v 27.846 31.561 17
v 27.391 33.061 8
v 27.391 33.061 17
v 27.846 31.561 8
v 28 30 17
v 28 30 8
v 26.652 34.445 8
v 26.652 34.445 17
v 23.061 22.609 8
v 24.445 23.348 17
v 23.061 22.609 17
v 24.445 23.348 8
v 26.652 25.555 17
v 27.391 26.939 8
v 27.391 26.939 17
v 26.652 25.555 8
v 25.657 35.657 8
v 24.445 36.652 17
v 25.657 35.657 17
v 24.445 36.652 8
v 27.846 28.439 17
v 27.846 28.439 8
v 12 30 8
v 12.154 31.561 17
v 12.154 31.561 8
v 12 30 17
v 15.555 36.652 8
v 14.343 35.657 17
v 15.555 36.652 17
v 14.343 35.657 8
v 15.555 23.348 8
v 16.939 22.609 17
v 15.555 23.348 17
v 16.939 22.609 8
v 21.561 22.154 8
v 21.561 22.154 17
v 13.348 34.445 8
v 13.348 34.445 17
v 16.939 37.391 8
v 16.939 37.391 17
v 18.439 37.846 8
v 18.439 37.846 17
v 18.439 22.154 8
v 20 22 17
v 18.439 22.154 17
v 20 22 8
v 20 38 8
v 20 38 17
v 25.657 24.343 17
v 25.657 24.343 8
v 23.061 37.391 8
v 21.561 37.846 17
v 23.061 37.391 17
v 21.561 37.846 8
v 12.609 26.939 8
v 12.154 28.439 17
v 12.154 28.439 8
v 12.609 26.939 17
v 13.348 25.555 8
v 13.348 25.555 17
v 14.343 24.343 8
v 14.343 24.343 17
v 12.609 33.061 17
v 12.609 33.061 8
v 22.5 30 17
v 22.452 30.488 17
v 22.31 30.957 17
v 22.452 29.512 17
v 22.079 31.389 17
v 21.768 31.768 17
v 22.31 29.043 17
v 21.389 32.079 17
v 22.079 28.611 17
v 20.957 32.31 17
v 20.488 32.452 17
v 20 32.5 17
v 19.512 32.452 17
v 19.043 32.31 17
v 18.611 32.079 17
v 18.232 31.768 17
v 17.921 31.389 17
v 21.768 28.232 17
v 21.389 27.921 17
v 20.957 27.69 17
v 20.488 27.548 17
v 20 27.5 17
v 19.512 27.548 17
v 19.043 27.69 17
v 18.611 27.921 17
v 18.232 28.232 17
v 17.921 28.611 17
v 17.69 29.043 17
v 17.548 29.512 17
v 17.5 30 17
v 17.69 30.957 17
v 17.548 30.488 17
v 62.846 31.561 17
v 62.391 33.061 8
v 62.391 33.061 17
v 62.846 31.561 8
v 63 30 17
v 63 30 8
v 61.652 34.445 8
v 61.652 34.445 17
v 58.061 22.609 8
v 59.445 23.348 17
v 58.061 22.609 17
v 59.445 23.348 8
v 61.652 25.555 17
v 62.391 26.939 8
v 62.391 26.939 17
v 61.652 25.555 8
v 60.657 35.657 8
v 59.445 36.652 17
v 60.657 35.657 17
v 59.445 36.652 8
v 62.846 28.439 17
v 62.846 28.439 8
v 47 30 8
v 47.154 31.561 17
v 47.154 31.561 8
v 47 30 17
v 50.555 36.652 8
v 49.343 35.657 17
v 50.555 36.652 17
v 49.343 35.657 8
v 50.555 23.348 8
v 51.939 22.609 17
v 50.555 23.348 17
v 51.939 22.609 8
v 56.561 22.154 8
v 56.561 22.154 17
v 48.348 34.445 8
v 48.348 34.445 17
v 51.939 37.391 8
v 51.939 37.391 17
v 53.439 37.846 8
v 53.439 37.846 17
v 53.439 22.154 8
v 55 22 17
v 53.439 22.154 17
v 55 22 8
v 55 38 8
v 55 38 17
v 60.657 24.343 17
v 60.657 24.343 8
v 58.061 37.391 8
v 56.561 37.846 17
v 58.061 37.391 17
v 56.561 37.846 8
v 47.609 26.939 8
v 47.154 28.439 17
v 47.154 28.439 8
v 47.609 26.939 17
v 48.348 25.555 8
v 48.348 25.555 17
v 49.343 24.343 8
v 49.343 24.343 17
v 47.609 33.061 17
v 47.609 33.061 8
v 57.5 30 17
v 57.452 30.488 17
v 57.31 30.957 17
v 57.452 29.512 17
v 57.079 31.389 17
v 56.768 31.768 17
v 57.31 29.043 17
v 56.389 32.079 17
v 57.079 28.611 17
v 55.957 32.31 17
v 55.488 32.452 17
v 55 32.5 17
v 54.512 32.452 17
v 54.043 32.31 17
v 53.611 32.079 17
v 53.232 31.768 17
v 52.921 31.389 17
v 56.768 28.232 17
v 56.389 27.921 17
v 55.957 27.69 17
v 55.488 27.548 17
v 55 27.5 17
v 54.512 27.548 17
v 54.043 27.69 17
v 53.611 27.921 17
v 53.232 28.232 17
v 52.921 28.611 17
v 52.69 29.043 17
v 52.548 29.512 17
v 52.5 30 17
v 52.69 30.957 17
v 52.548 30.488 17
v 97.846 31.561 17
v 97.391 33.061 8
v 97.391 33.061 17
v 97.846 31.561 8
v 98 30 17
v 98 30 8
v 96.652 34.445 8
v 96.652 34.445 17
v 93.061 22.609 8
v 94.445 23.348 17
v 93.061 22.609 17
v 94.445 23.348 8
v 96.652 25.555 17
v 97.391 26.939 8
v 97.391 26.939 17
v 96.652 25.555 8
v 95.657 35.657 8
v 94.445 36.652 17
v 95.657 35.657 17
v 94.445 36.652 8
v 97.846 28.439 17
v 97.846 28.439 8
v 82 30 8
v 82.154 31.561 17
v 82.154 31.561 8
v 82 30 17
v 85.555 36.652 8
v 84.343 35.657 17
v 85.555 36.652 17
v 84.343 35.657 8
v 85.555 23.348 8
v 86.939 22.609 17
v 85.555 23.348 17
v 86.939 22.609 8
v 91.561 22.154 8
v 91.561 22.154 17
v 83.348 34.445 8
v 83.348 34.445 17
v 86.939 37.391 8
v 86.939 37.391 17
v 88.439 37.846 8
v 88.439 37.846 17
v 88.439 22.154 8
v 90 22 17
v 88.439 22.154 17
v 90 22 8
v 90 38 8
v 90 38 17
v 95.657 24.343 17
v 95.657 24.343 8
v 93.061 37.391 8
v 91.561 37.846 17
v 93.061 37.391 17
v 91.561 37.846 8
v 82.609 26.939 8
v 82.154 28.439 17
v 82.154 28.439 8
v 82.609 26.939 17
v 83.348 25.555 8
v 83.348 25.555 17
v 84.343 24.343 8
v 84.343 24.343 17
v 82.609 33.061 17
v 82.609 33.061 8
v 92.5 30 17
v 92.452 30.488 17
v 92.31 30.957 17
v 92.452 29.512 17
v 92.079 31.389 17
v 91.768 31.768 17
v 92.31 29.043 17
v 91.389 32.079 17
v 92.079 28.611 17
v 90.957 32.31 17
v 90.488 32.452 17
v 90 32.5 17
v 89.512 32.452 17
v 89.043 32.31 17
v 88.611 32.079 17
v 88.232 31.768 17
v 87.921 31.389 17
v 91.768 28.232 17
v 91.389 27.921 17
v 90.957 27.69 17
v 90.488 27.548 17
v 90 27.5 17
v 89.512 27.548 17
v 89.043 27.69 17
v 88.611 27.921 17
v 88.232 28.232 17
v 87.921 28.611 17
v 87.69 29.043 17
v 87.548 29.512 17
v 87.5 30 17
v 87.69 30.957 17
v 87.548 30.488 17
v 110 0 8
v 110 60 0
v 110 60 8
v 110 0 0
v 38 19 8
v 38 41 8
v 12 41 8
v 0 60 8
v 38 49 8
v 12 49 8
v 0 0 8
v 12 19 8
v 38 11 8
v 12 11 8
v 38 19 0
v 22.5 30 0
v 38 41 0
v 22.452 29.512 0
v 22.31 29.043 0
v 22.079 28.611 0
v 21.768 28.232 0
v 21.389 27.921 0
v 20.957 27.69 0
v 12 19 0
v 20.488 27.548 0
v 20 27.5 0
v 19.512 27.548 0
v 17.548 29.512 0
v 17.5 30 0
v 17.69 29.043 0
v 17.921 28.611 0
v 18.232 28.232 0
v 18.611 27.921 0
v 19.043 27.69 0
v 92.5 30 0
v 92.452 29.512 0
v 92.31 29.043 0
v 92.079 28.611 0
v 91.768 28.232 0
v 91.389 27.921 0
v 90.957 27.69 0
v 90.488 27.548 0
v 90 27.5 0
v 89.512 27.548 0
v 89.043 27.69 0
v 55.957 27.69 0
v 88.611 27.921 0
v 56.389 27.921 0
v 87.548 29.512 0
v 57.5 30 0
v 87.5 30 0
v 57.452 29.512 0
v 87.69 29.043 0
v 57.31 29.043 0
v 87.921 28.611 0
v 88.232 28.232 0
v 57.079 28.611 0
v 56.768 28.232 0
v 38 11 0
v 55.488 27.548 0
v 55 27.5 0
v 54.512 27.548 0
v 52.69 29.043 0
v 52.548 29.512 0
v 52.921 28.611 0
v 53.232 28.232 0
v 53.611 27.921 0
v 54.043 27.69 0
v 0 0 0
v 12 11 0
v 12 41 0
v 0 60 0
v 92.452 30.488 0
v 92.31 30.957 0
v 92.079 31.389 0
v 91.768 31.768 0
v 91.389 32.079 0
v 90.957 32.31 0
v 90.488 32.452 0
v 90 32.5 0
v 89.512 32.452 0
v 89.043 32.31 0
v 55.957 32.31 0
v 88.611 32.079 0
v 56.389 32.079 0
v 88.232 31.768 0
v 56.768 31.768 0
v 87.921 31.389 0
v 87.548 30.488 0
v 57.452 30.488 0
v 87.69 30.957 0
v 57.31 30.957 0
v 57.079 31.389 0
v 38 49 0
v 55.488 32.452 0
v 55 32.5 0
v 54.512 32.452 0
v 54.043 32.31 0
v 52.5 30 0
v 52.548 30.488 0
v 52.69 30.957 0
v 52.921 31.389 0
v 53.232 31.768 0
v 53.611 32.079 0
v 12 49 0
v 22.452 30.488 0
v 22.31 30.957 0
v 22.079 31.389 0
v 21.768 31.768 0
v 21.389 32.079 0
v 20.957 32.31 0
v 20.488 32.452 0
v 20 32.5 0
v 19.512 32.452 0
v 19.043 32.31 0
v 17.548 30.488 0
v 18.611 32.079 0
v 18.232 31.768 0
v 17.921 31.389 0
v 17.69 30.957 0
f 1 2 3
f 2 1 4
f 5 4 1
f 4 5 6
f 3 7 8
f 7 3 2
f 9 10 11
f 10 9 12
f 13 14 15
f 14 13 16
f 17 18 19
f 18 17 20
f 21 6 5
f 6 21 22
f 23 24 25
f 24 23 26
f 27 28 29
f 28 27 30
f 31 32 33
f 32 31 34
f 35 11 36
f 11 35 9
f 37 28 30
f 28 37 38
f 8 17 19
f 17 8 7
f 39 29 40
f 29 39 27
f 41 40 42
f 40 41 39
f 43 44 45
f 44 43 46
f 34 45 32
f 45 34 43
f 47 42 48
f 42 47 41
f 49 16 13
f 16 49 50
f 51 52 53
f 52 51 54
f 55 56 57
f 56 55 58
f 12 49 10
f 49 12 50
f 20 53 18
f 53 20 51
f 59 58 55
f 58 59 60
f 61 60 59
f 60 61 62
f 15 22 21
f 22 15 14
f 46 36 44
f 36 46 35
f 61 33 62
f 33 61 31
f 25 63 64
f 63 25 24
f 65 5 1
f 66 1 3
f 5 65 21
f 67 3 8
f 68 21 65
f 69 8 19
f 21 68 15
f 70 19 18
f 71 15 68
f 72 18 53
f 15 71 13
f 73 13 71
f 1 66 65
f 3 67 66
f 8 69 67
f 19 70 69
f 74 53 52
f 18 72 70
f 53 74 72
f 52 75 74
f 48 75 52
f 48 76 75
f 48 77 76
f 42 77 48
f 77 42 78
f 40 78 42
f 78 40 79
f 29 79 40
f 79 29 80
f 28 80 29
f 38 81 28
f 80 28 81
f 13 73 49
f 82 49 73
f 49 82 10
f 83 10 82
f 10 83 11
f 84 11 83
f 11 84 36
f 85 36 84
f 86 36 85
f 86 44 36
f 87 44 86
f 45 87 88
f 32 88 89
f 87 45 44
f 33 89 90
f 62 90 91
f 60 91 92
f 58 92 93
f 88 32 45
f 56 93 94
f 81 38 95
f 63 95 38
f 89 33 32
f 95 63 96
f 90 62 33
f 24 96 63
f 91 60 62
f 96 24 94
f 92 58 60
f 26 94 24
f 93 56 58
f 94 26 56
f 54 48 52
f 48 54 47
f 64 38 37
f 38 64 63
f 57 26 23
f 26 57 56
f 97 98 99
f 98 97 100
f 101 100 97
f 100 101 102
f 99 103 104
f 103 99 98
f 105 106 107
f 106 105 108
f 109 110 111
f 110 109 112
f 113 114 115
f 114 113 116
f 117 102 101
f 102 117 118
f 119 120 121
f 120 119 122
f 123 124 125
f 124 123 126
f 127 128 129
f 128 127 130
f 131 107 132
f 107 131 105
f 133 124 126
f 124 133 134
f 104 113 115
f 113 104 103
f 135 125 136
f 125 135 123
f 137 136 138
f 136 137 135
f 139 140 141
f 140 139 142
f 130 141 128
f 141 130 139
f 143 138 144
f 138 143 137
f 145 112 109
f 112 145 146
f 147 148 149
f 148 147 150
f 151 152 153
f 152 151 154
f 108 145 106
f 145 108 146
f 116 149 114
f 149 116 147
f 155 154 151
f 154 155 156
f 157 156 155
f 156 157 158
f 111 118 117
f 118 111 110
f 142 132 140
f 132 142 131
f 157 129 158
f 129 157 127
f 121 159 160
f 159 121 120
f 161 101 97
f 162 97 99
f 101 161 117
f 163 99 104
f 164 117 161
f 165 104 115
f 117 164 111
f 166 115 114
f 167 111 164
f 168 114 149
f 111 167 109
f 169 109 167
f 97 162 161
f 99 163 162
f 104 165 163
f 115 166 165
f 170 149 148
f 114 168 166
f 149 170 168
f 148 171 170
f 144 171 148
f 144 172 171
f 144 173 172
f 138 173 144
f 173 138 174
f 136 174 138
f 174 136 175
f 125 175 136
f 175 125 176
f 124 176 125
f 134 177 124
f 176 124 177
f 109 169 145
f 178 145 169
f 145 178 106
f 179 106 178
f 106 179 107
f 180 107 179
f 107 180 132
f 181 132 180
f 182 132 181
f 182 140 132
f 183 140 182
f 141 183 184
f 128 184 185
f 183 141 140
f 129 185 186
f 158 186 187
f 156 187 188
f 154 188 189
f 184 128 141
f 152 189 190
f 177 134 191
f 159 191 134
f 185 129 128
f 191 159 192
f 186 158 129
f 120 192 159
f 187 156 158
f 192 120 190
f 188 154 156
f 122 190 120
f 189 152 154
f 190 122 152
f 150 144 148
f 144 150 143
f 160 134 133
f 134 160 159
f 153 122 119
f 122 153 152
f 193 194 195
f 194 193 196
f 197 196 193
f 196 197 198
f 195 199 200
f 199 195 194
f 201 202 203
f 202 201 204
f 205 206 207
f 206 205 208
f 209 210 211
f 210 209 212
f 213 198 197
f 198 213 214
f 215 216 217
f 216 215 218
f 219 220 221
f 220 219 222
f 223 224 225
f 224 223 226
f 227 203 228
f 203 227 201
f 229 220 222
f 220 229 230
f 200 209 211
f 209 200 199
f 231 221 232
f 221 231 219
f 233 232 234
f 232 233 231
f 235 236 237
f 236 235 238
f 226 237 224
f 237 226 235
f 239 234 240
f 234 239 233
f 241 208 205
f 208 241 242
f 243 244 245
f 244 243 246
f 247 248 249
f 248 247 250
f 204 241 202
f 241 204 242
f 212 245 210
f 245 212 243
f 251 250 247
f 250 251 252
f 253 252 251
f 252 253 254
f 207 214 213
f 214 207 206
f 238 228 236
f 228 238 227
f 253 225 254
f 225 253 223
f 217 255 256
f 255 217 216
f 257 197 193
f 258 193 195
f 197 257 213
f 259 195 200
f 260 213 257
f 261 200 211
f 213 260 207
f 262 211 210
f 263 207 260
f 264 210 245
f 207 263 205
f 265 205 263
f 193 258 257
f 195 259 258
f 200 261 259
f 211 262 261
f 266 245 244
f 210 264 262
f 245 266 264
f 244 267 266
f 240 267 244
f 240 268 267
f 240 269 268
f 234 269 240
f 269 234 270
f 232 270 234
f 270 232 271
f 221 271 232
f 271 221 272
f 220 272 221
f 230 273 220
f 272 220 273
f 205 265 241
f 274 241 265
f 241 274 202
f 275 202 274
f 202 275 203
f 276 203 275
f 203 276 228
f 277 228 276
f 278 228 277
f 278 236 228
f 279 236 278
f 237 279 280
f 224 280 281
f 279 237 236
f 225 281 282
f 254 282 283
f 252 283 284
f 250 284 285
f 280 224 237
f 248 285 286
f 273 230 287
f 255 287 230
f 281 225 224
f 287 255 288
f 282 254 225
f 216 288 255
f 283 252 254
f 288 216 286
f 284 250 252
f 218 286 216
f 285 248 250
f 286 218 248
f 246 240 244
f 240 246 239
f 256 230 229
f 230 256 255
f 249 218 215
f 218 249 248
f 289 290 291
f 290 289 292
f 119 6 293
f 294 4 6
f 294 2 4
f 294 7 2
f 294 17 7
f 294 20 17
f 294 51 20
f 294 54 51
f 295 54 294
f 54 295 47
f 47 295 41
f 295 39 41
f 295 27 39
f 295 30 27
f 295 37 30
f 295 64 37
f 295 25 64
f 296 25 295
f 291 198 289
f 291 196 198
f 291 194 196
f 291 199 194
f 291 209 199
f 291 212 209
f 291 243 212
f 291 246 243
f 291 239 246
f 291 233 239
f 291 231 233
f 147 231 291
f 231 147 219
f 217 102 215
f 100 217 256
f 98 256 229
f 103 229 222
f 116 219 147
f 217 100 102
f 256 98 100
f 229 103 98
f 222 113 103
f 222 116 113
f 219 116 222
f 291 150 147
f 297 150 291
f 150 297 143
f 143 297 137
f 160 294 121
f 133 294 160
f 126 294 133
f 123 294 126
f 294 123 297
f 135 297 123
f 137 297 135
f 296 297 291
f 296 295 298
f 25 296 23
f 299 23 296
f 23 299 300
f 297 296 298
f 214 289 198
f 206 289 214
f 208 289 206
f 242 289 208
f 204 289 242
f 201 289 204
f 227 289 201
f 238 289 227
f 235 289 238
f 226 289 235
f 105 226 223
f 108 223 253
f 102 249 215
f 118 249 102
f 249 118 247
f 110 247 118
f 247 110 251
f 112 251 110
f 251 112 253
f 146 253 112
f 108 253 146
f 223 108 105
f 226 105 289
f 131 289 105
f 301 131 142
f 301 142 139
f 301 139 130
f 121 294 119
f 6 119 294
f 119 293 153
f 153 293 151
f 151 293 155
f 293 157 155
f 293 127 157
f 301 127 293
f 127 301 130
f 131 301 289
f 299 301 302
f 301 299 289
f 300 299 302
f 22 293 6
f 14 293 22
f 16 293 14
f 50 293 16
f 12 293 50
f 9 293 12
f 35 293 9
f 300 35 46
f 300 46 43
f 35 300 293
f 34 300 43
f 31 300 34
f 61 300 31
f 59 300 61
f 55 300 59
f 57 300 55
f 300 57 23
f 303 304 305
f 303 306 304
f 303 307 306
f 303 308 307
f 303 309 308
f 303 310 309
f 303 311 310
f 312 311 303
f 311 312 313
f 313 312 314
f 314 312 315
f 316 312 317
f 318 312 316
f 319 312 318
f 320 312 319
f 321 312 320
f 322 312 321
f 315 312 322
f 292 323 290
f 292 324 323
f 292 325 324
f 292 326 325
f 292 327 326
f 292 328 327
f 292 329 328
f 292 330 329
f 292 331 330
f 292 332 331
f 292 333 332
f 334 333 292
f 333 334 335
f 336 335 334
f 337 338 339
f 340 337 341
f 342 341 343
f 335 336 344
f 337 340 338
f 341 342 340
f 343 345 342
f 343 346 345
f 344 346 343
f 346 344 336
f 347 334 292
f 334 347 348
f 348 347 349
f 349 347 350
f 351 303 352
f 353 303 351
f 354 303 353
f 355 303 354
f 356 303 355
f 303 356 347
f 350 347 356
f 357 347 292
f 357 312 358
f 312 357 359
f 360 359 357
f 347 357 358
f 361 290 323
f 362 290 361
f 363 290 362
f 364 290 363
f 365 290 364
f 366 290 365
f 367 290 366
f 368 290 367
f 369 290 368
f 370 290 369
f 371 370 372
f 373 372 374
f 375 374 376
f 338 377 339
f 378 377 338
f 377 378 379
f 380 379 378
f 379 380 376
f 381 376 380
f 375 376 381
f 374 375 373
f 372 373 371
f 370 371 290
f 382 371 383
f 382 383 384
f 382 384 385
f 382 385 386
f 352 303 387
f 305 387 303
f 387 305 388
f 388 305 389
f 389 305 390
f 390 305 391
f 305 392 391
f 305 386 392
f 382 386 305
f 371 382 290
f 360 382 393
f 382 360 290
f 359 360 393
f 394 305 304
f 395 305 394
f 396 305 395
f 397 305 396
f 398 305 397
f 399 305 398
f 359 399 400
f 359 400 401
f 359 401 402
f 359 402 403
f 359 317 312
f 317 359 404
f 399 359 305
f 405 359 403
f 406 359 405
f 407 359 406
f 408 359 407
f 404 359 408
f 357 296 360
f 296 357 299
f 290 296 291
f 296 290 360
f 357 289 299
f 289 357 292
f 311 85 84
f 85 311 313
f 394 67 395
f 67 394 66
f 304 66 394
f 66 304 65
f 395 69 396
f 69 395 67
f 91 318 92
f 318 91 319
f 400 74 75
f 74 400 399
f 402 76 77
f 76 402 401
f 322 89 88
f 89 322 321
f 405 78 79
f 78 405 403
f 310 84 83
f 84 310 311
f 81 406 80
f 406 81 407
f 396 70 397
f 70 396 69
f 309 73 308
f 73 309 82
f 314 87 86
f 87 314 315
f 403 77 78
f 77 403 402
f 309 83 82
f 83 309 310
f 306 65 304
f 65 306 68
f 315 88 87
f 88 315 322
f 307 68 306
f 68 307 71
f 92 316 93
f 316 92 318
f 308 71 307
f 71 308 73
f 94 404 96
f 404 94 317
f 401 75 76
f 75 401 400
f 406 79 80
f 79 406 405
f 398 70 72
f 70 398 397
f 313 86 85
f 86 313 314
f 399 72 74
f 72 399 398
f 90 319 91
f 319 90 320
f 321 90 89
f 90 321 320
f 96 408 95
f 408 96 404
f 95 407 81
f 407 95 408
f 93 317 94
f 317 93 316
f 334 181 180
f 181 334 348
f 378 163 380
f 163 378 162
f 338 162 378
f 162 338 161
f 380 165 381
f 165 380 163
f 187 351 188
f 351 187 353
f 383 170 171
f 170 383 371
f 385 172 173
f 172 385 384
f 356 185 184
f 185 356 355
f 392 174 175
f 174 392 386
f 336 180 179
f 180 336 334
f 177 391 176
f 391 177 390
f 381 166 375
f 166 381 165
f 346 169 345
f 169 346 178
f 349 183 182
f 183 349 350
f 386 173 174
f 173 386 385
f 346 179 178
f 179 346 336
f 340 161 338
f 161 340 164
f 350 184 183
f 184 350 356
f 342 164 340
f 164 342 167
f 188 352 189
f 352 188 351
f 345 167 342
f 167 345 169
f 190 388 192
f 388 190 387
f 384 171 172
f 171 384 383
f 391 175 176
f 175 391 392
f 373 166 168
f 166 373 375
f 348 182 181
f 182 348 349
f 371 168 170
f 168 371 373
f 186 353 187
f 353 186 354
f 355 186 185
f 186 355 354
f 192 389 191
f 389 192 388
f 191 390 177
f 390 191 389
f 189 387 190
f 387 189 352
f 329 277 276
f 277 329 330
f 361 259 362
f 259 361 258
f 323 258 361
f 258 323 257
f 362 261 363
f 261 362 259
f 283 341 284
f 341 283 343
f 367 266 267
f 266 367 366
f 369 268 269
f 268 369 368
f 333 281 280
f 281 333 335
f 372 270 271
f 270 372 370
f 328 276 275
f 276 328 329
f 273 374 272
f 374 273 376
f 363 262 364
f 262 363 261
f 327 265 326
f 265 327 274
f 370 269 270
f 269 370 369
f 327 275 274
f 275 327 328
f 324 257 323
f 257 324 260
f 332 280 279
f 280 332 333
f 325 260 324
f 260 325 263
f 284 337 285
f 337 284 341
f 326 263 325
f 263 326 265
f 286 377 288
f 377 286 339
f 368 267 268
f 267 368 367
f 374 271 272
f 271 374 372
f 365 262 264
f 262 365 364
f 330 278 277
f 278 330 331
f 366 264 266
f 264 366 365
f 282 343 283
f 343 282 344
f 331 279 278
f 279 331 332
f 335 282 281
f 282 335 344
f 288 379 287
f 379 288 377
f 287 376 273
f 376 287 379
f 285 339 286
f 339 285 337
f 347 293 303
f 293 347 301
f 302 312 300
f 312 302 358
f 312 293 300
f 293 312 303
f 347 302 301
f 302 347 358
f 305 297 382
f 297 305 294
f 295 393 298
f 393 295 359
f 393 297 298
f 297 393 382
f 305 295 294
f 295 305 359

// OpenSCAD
$fn = 32;

// ----------------------------------------------------------------------
// Drill jig: three_boss_slot jig
// ----------------------------------------------------------------------

// --- parameters (mm) ---
plate_l = 110;            // plate length, X
plate_w = 60;             // plate width, Y
plate_t = 8;              // plate thickness
boss_d = 16;              // guide boss diameter
boss_h = 10;              // boss height above the plate
guide_d = 5;              // guide hole diameter
boss_pitch = 35;          // boss pitch
slot_w = 8;               // clamp slot width
slot_l = 26;              // clamp slot length
slot_x = 12;              // slot start X

n_boss = 3;  // guide bosses
boss_x0 = (plate_l - (n_boss - 1) * boss_pitch) / 2;  // first boss X
boss_top = plate_t - 1 + boss_h;  // boss crown height
total_h = boss_top;  // overall height

difference() {
  union() {
  cube([plate_l, plate_w, plate_t]);
  for (i = [0 : n_boss - 1])
    translate([boss_x0 + i * boss_pitch, plate_w / 2, plate_t - 1])
      cylinder(h = boss_h, d = boss_d);
  }
  for (i = [0 : n_boss - 1])
    translate([boss_x0 + i * boss_pitch, plate_w / 2, -1])
      cylinder(h = plate_t + boss_h, d = guide_d);
  for (cy = [plate_w * 0.25, plate_w * 0.75])
    translate([slot_x, cy - slot_w / 2, -1])
      cube([slot_l, slot_w, plate_t + 2]);
}
